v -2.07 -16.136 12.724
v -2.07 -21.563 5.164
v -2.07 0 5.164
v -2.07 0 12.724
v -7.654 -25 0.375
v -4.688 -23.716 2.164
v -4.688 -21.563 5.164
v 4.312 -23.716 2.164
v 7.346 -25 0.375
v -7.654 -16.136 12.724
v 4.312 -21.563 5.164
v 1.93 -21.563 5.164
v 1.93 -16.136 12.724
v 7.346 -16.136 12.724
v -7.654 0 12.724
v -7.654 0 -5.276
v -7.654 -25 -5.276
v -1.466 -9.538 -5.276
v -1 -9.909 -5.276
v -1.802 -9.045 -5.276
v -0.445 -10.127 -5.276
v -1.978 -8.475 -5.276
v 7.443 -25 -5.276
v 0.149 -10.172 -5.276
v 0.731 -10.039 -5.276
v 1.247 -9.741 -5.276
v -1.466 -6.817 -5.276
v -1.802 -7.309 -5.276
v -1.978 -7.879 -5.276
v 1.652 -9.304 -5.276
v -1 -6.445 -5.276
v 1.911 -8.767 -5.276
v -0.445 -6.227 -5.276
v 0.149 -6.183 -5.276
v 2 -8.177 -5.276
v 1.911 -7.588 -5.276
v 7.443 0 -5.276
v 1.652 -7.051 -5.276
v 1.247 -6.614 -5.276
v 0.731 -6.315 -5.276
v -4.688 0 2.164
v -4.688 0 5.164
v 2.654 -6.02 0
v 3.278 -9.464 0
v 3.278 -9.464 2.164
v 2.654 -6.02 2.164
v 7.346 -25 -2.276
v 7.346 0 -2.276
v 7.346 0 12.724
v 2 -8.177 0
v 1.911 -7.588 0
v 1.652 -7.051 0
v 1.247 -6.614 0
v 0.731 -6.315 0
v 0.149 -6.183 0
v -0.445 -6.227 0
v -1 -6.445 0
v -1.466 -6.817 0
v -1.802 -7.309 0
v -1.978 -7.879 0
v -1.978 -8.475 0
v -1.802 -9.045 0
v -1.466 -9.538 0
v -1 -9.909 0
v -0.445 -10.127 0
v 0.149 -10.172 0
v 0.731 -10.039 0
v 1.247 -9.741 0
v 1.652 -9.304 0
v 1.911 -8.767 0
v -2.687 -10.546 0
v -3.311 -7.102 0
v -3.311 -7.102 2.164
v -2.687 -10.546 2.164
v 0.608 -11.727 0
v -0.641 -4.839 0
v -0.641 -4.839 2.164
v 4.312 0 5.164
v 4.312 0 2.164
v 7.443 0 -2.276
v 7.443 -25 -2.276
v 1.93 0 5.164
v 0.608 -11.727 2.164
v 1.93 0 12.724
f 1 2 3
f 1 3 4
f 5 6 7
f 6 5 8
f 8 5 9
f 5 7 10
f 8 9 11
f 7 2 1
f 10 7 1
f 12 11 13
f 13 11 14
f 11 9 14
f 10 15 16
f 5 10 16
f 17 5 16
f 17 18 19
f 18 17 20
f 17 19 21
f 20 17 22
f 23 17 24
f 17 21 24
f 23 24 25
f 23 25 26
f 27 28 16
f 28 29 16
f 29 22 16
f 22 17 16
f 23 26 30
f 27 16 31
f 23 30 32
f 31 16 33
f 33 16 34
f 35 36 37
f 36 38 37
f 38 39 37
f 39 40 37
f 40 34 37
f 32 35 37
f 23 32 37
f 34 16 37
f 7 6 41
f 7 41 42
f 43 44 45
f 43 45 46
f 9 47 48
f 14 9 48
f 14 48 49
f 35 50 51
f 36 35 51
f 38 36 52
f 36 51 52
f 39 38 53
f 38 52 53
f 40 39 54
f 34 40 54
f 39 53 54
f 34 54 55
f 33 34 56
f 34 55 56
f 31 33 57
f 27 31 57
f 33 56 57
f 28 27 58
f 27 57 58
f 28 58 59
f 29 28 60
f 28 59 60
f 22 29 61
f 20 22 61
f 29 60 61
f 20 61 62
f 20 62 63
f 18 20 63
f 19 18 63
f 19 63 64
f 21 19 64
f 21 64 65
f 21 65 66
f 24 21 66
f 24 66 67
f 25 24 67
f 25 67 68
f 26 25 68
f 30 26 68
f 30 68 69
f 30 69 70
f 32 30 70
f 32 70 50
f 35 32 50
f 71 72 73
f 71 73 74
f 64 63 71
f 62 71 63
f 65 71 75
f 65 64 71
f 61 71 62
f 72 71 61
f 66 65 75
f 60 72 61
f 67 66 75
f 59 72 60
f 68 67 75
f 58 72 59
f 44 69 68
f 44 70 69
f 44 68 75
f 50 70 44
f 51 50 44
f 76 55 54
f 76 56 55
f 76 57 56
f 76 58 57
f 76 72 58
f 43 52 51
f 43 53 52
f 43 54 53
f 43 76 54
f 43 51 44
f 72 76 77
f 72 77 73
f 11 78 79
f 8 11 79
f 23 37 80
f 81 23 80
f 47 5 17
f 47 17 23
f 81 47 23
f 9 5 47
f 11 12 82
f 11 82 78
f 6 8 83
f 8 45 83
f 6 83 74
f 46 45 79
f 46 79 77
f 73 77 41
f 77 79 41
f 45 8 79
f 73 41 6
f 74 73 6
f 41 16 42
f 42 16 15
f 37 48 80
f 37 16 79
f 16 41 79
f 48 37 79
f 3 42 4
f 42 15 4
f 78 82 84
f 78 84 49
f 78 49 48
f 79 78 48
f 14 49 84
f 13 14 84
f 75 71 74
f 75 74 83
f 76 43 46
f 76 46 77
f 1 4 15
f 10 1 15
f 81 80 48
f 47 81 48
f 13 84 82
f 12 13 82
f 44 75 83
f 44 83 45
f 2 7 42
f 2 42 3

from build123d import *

# Parameters (mm, degrees)
F1_DEPTH = 25
F3_DEPTH = 18.7
F5_DEPTH = 3
F6_R     = 2
F7_DEPTH = 25


with BuildPart() as f1:
    # F0 (on Front) → F1 (new body)
    with BuildSketch(Plane.XZ):
        Polygon((-2.070283, 12.724239), (-7.654176, 12.724239), (-7.654176, -2.275761), (7.345824, -2.275761), (7.345824, 12.724239), (1.929717, 12.724239), (1.929717, 5.163504), (4.312236, 5.163504), (4.312236, 2.163504), (-4.687764, 2.163504), (-4.687764, 5.163504), (-2.070283, 5.163504), align=None)
        Polygon((7.345824, -2.275761), (-7.654176, -2.275761), (-7.654176, -5.275761), (7.44284, -5.275761), (7.44284, -2.275761), align=None)
    extrude(amount=F1_DEPTH)

    # F2 (on Right) → F3 (cut, symmetric)
    with BuildSketch(Plane.YZ):
        Polygon((-30.076236, 15.53787), (-27.17446, -2.654033), (-14.116468, 15.53787), align=None)
    extrude(amount=F3_DEPTH, both=True, mode=Mode.SUBTRACT)

    # F4 (on Top) → F5 (cut)
    with BuildSketch(Plane.XY):
        Polygon((3.278356, -9.464068), (2.653948, -6.020216), (-0.640718, -4.839043), (-3.310978, -7.101722), (-2.68657, -10.545573), (0.608097, -11.726746), align=None)
    extrude(amount=F5_DEPTH, mode=Mode.SUBTRACT)

    # F6 (on face) → F7 (cut)
    with BuildSketch(Plane.XY):
        with Locations((0, -8.177196)):
            Circle(F6_R)
    extrude(amount=-F7_DEPTH, mode=Mode.SUBTRACT)


solid = f1.part
